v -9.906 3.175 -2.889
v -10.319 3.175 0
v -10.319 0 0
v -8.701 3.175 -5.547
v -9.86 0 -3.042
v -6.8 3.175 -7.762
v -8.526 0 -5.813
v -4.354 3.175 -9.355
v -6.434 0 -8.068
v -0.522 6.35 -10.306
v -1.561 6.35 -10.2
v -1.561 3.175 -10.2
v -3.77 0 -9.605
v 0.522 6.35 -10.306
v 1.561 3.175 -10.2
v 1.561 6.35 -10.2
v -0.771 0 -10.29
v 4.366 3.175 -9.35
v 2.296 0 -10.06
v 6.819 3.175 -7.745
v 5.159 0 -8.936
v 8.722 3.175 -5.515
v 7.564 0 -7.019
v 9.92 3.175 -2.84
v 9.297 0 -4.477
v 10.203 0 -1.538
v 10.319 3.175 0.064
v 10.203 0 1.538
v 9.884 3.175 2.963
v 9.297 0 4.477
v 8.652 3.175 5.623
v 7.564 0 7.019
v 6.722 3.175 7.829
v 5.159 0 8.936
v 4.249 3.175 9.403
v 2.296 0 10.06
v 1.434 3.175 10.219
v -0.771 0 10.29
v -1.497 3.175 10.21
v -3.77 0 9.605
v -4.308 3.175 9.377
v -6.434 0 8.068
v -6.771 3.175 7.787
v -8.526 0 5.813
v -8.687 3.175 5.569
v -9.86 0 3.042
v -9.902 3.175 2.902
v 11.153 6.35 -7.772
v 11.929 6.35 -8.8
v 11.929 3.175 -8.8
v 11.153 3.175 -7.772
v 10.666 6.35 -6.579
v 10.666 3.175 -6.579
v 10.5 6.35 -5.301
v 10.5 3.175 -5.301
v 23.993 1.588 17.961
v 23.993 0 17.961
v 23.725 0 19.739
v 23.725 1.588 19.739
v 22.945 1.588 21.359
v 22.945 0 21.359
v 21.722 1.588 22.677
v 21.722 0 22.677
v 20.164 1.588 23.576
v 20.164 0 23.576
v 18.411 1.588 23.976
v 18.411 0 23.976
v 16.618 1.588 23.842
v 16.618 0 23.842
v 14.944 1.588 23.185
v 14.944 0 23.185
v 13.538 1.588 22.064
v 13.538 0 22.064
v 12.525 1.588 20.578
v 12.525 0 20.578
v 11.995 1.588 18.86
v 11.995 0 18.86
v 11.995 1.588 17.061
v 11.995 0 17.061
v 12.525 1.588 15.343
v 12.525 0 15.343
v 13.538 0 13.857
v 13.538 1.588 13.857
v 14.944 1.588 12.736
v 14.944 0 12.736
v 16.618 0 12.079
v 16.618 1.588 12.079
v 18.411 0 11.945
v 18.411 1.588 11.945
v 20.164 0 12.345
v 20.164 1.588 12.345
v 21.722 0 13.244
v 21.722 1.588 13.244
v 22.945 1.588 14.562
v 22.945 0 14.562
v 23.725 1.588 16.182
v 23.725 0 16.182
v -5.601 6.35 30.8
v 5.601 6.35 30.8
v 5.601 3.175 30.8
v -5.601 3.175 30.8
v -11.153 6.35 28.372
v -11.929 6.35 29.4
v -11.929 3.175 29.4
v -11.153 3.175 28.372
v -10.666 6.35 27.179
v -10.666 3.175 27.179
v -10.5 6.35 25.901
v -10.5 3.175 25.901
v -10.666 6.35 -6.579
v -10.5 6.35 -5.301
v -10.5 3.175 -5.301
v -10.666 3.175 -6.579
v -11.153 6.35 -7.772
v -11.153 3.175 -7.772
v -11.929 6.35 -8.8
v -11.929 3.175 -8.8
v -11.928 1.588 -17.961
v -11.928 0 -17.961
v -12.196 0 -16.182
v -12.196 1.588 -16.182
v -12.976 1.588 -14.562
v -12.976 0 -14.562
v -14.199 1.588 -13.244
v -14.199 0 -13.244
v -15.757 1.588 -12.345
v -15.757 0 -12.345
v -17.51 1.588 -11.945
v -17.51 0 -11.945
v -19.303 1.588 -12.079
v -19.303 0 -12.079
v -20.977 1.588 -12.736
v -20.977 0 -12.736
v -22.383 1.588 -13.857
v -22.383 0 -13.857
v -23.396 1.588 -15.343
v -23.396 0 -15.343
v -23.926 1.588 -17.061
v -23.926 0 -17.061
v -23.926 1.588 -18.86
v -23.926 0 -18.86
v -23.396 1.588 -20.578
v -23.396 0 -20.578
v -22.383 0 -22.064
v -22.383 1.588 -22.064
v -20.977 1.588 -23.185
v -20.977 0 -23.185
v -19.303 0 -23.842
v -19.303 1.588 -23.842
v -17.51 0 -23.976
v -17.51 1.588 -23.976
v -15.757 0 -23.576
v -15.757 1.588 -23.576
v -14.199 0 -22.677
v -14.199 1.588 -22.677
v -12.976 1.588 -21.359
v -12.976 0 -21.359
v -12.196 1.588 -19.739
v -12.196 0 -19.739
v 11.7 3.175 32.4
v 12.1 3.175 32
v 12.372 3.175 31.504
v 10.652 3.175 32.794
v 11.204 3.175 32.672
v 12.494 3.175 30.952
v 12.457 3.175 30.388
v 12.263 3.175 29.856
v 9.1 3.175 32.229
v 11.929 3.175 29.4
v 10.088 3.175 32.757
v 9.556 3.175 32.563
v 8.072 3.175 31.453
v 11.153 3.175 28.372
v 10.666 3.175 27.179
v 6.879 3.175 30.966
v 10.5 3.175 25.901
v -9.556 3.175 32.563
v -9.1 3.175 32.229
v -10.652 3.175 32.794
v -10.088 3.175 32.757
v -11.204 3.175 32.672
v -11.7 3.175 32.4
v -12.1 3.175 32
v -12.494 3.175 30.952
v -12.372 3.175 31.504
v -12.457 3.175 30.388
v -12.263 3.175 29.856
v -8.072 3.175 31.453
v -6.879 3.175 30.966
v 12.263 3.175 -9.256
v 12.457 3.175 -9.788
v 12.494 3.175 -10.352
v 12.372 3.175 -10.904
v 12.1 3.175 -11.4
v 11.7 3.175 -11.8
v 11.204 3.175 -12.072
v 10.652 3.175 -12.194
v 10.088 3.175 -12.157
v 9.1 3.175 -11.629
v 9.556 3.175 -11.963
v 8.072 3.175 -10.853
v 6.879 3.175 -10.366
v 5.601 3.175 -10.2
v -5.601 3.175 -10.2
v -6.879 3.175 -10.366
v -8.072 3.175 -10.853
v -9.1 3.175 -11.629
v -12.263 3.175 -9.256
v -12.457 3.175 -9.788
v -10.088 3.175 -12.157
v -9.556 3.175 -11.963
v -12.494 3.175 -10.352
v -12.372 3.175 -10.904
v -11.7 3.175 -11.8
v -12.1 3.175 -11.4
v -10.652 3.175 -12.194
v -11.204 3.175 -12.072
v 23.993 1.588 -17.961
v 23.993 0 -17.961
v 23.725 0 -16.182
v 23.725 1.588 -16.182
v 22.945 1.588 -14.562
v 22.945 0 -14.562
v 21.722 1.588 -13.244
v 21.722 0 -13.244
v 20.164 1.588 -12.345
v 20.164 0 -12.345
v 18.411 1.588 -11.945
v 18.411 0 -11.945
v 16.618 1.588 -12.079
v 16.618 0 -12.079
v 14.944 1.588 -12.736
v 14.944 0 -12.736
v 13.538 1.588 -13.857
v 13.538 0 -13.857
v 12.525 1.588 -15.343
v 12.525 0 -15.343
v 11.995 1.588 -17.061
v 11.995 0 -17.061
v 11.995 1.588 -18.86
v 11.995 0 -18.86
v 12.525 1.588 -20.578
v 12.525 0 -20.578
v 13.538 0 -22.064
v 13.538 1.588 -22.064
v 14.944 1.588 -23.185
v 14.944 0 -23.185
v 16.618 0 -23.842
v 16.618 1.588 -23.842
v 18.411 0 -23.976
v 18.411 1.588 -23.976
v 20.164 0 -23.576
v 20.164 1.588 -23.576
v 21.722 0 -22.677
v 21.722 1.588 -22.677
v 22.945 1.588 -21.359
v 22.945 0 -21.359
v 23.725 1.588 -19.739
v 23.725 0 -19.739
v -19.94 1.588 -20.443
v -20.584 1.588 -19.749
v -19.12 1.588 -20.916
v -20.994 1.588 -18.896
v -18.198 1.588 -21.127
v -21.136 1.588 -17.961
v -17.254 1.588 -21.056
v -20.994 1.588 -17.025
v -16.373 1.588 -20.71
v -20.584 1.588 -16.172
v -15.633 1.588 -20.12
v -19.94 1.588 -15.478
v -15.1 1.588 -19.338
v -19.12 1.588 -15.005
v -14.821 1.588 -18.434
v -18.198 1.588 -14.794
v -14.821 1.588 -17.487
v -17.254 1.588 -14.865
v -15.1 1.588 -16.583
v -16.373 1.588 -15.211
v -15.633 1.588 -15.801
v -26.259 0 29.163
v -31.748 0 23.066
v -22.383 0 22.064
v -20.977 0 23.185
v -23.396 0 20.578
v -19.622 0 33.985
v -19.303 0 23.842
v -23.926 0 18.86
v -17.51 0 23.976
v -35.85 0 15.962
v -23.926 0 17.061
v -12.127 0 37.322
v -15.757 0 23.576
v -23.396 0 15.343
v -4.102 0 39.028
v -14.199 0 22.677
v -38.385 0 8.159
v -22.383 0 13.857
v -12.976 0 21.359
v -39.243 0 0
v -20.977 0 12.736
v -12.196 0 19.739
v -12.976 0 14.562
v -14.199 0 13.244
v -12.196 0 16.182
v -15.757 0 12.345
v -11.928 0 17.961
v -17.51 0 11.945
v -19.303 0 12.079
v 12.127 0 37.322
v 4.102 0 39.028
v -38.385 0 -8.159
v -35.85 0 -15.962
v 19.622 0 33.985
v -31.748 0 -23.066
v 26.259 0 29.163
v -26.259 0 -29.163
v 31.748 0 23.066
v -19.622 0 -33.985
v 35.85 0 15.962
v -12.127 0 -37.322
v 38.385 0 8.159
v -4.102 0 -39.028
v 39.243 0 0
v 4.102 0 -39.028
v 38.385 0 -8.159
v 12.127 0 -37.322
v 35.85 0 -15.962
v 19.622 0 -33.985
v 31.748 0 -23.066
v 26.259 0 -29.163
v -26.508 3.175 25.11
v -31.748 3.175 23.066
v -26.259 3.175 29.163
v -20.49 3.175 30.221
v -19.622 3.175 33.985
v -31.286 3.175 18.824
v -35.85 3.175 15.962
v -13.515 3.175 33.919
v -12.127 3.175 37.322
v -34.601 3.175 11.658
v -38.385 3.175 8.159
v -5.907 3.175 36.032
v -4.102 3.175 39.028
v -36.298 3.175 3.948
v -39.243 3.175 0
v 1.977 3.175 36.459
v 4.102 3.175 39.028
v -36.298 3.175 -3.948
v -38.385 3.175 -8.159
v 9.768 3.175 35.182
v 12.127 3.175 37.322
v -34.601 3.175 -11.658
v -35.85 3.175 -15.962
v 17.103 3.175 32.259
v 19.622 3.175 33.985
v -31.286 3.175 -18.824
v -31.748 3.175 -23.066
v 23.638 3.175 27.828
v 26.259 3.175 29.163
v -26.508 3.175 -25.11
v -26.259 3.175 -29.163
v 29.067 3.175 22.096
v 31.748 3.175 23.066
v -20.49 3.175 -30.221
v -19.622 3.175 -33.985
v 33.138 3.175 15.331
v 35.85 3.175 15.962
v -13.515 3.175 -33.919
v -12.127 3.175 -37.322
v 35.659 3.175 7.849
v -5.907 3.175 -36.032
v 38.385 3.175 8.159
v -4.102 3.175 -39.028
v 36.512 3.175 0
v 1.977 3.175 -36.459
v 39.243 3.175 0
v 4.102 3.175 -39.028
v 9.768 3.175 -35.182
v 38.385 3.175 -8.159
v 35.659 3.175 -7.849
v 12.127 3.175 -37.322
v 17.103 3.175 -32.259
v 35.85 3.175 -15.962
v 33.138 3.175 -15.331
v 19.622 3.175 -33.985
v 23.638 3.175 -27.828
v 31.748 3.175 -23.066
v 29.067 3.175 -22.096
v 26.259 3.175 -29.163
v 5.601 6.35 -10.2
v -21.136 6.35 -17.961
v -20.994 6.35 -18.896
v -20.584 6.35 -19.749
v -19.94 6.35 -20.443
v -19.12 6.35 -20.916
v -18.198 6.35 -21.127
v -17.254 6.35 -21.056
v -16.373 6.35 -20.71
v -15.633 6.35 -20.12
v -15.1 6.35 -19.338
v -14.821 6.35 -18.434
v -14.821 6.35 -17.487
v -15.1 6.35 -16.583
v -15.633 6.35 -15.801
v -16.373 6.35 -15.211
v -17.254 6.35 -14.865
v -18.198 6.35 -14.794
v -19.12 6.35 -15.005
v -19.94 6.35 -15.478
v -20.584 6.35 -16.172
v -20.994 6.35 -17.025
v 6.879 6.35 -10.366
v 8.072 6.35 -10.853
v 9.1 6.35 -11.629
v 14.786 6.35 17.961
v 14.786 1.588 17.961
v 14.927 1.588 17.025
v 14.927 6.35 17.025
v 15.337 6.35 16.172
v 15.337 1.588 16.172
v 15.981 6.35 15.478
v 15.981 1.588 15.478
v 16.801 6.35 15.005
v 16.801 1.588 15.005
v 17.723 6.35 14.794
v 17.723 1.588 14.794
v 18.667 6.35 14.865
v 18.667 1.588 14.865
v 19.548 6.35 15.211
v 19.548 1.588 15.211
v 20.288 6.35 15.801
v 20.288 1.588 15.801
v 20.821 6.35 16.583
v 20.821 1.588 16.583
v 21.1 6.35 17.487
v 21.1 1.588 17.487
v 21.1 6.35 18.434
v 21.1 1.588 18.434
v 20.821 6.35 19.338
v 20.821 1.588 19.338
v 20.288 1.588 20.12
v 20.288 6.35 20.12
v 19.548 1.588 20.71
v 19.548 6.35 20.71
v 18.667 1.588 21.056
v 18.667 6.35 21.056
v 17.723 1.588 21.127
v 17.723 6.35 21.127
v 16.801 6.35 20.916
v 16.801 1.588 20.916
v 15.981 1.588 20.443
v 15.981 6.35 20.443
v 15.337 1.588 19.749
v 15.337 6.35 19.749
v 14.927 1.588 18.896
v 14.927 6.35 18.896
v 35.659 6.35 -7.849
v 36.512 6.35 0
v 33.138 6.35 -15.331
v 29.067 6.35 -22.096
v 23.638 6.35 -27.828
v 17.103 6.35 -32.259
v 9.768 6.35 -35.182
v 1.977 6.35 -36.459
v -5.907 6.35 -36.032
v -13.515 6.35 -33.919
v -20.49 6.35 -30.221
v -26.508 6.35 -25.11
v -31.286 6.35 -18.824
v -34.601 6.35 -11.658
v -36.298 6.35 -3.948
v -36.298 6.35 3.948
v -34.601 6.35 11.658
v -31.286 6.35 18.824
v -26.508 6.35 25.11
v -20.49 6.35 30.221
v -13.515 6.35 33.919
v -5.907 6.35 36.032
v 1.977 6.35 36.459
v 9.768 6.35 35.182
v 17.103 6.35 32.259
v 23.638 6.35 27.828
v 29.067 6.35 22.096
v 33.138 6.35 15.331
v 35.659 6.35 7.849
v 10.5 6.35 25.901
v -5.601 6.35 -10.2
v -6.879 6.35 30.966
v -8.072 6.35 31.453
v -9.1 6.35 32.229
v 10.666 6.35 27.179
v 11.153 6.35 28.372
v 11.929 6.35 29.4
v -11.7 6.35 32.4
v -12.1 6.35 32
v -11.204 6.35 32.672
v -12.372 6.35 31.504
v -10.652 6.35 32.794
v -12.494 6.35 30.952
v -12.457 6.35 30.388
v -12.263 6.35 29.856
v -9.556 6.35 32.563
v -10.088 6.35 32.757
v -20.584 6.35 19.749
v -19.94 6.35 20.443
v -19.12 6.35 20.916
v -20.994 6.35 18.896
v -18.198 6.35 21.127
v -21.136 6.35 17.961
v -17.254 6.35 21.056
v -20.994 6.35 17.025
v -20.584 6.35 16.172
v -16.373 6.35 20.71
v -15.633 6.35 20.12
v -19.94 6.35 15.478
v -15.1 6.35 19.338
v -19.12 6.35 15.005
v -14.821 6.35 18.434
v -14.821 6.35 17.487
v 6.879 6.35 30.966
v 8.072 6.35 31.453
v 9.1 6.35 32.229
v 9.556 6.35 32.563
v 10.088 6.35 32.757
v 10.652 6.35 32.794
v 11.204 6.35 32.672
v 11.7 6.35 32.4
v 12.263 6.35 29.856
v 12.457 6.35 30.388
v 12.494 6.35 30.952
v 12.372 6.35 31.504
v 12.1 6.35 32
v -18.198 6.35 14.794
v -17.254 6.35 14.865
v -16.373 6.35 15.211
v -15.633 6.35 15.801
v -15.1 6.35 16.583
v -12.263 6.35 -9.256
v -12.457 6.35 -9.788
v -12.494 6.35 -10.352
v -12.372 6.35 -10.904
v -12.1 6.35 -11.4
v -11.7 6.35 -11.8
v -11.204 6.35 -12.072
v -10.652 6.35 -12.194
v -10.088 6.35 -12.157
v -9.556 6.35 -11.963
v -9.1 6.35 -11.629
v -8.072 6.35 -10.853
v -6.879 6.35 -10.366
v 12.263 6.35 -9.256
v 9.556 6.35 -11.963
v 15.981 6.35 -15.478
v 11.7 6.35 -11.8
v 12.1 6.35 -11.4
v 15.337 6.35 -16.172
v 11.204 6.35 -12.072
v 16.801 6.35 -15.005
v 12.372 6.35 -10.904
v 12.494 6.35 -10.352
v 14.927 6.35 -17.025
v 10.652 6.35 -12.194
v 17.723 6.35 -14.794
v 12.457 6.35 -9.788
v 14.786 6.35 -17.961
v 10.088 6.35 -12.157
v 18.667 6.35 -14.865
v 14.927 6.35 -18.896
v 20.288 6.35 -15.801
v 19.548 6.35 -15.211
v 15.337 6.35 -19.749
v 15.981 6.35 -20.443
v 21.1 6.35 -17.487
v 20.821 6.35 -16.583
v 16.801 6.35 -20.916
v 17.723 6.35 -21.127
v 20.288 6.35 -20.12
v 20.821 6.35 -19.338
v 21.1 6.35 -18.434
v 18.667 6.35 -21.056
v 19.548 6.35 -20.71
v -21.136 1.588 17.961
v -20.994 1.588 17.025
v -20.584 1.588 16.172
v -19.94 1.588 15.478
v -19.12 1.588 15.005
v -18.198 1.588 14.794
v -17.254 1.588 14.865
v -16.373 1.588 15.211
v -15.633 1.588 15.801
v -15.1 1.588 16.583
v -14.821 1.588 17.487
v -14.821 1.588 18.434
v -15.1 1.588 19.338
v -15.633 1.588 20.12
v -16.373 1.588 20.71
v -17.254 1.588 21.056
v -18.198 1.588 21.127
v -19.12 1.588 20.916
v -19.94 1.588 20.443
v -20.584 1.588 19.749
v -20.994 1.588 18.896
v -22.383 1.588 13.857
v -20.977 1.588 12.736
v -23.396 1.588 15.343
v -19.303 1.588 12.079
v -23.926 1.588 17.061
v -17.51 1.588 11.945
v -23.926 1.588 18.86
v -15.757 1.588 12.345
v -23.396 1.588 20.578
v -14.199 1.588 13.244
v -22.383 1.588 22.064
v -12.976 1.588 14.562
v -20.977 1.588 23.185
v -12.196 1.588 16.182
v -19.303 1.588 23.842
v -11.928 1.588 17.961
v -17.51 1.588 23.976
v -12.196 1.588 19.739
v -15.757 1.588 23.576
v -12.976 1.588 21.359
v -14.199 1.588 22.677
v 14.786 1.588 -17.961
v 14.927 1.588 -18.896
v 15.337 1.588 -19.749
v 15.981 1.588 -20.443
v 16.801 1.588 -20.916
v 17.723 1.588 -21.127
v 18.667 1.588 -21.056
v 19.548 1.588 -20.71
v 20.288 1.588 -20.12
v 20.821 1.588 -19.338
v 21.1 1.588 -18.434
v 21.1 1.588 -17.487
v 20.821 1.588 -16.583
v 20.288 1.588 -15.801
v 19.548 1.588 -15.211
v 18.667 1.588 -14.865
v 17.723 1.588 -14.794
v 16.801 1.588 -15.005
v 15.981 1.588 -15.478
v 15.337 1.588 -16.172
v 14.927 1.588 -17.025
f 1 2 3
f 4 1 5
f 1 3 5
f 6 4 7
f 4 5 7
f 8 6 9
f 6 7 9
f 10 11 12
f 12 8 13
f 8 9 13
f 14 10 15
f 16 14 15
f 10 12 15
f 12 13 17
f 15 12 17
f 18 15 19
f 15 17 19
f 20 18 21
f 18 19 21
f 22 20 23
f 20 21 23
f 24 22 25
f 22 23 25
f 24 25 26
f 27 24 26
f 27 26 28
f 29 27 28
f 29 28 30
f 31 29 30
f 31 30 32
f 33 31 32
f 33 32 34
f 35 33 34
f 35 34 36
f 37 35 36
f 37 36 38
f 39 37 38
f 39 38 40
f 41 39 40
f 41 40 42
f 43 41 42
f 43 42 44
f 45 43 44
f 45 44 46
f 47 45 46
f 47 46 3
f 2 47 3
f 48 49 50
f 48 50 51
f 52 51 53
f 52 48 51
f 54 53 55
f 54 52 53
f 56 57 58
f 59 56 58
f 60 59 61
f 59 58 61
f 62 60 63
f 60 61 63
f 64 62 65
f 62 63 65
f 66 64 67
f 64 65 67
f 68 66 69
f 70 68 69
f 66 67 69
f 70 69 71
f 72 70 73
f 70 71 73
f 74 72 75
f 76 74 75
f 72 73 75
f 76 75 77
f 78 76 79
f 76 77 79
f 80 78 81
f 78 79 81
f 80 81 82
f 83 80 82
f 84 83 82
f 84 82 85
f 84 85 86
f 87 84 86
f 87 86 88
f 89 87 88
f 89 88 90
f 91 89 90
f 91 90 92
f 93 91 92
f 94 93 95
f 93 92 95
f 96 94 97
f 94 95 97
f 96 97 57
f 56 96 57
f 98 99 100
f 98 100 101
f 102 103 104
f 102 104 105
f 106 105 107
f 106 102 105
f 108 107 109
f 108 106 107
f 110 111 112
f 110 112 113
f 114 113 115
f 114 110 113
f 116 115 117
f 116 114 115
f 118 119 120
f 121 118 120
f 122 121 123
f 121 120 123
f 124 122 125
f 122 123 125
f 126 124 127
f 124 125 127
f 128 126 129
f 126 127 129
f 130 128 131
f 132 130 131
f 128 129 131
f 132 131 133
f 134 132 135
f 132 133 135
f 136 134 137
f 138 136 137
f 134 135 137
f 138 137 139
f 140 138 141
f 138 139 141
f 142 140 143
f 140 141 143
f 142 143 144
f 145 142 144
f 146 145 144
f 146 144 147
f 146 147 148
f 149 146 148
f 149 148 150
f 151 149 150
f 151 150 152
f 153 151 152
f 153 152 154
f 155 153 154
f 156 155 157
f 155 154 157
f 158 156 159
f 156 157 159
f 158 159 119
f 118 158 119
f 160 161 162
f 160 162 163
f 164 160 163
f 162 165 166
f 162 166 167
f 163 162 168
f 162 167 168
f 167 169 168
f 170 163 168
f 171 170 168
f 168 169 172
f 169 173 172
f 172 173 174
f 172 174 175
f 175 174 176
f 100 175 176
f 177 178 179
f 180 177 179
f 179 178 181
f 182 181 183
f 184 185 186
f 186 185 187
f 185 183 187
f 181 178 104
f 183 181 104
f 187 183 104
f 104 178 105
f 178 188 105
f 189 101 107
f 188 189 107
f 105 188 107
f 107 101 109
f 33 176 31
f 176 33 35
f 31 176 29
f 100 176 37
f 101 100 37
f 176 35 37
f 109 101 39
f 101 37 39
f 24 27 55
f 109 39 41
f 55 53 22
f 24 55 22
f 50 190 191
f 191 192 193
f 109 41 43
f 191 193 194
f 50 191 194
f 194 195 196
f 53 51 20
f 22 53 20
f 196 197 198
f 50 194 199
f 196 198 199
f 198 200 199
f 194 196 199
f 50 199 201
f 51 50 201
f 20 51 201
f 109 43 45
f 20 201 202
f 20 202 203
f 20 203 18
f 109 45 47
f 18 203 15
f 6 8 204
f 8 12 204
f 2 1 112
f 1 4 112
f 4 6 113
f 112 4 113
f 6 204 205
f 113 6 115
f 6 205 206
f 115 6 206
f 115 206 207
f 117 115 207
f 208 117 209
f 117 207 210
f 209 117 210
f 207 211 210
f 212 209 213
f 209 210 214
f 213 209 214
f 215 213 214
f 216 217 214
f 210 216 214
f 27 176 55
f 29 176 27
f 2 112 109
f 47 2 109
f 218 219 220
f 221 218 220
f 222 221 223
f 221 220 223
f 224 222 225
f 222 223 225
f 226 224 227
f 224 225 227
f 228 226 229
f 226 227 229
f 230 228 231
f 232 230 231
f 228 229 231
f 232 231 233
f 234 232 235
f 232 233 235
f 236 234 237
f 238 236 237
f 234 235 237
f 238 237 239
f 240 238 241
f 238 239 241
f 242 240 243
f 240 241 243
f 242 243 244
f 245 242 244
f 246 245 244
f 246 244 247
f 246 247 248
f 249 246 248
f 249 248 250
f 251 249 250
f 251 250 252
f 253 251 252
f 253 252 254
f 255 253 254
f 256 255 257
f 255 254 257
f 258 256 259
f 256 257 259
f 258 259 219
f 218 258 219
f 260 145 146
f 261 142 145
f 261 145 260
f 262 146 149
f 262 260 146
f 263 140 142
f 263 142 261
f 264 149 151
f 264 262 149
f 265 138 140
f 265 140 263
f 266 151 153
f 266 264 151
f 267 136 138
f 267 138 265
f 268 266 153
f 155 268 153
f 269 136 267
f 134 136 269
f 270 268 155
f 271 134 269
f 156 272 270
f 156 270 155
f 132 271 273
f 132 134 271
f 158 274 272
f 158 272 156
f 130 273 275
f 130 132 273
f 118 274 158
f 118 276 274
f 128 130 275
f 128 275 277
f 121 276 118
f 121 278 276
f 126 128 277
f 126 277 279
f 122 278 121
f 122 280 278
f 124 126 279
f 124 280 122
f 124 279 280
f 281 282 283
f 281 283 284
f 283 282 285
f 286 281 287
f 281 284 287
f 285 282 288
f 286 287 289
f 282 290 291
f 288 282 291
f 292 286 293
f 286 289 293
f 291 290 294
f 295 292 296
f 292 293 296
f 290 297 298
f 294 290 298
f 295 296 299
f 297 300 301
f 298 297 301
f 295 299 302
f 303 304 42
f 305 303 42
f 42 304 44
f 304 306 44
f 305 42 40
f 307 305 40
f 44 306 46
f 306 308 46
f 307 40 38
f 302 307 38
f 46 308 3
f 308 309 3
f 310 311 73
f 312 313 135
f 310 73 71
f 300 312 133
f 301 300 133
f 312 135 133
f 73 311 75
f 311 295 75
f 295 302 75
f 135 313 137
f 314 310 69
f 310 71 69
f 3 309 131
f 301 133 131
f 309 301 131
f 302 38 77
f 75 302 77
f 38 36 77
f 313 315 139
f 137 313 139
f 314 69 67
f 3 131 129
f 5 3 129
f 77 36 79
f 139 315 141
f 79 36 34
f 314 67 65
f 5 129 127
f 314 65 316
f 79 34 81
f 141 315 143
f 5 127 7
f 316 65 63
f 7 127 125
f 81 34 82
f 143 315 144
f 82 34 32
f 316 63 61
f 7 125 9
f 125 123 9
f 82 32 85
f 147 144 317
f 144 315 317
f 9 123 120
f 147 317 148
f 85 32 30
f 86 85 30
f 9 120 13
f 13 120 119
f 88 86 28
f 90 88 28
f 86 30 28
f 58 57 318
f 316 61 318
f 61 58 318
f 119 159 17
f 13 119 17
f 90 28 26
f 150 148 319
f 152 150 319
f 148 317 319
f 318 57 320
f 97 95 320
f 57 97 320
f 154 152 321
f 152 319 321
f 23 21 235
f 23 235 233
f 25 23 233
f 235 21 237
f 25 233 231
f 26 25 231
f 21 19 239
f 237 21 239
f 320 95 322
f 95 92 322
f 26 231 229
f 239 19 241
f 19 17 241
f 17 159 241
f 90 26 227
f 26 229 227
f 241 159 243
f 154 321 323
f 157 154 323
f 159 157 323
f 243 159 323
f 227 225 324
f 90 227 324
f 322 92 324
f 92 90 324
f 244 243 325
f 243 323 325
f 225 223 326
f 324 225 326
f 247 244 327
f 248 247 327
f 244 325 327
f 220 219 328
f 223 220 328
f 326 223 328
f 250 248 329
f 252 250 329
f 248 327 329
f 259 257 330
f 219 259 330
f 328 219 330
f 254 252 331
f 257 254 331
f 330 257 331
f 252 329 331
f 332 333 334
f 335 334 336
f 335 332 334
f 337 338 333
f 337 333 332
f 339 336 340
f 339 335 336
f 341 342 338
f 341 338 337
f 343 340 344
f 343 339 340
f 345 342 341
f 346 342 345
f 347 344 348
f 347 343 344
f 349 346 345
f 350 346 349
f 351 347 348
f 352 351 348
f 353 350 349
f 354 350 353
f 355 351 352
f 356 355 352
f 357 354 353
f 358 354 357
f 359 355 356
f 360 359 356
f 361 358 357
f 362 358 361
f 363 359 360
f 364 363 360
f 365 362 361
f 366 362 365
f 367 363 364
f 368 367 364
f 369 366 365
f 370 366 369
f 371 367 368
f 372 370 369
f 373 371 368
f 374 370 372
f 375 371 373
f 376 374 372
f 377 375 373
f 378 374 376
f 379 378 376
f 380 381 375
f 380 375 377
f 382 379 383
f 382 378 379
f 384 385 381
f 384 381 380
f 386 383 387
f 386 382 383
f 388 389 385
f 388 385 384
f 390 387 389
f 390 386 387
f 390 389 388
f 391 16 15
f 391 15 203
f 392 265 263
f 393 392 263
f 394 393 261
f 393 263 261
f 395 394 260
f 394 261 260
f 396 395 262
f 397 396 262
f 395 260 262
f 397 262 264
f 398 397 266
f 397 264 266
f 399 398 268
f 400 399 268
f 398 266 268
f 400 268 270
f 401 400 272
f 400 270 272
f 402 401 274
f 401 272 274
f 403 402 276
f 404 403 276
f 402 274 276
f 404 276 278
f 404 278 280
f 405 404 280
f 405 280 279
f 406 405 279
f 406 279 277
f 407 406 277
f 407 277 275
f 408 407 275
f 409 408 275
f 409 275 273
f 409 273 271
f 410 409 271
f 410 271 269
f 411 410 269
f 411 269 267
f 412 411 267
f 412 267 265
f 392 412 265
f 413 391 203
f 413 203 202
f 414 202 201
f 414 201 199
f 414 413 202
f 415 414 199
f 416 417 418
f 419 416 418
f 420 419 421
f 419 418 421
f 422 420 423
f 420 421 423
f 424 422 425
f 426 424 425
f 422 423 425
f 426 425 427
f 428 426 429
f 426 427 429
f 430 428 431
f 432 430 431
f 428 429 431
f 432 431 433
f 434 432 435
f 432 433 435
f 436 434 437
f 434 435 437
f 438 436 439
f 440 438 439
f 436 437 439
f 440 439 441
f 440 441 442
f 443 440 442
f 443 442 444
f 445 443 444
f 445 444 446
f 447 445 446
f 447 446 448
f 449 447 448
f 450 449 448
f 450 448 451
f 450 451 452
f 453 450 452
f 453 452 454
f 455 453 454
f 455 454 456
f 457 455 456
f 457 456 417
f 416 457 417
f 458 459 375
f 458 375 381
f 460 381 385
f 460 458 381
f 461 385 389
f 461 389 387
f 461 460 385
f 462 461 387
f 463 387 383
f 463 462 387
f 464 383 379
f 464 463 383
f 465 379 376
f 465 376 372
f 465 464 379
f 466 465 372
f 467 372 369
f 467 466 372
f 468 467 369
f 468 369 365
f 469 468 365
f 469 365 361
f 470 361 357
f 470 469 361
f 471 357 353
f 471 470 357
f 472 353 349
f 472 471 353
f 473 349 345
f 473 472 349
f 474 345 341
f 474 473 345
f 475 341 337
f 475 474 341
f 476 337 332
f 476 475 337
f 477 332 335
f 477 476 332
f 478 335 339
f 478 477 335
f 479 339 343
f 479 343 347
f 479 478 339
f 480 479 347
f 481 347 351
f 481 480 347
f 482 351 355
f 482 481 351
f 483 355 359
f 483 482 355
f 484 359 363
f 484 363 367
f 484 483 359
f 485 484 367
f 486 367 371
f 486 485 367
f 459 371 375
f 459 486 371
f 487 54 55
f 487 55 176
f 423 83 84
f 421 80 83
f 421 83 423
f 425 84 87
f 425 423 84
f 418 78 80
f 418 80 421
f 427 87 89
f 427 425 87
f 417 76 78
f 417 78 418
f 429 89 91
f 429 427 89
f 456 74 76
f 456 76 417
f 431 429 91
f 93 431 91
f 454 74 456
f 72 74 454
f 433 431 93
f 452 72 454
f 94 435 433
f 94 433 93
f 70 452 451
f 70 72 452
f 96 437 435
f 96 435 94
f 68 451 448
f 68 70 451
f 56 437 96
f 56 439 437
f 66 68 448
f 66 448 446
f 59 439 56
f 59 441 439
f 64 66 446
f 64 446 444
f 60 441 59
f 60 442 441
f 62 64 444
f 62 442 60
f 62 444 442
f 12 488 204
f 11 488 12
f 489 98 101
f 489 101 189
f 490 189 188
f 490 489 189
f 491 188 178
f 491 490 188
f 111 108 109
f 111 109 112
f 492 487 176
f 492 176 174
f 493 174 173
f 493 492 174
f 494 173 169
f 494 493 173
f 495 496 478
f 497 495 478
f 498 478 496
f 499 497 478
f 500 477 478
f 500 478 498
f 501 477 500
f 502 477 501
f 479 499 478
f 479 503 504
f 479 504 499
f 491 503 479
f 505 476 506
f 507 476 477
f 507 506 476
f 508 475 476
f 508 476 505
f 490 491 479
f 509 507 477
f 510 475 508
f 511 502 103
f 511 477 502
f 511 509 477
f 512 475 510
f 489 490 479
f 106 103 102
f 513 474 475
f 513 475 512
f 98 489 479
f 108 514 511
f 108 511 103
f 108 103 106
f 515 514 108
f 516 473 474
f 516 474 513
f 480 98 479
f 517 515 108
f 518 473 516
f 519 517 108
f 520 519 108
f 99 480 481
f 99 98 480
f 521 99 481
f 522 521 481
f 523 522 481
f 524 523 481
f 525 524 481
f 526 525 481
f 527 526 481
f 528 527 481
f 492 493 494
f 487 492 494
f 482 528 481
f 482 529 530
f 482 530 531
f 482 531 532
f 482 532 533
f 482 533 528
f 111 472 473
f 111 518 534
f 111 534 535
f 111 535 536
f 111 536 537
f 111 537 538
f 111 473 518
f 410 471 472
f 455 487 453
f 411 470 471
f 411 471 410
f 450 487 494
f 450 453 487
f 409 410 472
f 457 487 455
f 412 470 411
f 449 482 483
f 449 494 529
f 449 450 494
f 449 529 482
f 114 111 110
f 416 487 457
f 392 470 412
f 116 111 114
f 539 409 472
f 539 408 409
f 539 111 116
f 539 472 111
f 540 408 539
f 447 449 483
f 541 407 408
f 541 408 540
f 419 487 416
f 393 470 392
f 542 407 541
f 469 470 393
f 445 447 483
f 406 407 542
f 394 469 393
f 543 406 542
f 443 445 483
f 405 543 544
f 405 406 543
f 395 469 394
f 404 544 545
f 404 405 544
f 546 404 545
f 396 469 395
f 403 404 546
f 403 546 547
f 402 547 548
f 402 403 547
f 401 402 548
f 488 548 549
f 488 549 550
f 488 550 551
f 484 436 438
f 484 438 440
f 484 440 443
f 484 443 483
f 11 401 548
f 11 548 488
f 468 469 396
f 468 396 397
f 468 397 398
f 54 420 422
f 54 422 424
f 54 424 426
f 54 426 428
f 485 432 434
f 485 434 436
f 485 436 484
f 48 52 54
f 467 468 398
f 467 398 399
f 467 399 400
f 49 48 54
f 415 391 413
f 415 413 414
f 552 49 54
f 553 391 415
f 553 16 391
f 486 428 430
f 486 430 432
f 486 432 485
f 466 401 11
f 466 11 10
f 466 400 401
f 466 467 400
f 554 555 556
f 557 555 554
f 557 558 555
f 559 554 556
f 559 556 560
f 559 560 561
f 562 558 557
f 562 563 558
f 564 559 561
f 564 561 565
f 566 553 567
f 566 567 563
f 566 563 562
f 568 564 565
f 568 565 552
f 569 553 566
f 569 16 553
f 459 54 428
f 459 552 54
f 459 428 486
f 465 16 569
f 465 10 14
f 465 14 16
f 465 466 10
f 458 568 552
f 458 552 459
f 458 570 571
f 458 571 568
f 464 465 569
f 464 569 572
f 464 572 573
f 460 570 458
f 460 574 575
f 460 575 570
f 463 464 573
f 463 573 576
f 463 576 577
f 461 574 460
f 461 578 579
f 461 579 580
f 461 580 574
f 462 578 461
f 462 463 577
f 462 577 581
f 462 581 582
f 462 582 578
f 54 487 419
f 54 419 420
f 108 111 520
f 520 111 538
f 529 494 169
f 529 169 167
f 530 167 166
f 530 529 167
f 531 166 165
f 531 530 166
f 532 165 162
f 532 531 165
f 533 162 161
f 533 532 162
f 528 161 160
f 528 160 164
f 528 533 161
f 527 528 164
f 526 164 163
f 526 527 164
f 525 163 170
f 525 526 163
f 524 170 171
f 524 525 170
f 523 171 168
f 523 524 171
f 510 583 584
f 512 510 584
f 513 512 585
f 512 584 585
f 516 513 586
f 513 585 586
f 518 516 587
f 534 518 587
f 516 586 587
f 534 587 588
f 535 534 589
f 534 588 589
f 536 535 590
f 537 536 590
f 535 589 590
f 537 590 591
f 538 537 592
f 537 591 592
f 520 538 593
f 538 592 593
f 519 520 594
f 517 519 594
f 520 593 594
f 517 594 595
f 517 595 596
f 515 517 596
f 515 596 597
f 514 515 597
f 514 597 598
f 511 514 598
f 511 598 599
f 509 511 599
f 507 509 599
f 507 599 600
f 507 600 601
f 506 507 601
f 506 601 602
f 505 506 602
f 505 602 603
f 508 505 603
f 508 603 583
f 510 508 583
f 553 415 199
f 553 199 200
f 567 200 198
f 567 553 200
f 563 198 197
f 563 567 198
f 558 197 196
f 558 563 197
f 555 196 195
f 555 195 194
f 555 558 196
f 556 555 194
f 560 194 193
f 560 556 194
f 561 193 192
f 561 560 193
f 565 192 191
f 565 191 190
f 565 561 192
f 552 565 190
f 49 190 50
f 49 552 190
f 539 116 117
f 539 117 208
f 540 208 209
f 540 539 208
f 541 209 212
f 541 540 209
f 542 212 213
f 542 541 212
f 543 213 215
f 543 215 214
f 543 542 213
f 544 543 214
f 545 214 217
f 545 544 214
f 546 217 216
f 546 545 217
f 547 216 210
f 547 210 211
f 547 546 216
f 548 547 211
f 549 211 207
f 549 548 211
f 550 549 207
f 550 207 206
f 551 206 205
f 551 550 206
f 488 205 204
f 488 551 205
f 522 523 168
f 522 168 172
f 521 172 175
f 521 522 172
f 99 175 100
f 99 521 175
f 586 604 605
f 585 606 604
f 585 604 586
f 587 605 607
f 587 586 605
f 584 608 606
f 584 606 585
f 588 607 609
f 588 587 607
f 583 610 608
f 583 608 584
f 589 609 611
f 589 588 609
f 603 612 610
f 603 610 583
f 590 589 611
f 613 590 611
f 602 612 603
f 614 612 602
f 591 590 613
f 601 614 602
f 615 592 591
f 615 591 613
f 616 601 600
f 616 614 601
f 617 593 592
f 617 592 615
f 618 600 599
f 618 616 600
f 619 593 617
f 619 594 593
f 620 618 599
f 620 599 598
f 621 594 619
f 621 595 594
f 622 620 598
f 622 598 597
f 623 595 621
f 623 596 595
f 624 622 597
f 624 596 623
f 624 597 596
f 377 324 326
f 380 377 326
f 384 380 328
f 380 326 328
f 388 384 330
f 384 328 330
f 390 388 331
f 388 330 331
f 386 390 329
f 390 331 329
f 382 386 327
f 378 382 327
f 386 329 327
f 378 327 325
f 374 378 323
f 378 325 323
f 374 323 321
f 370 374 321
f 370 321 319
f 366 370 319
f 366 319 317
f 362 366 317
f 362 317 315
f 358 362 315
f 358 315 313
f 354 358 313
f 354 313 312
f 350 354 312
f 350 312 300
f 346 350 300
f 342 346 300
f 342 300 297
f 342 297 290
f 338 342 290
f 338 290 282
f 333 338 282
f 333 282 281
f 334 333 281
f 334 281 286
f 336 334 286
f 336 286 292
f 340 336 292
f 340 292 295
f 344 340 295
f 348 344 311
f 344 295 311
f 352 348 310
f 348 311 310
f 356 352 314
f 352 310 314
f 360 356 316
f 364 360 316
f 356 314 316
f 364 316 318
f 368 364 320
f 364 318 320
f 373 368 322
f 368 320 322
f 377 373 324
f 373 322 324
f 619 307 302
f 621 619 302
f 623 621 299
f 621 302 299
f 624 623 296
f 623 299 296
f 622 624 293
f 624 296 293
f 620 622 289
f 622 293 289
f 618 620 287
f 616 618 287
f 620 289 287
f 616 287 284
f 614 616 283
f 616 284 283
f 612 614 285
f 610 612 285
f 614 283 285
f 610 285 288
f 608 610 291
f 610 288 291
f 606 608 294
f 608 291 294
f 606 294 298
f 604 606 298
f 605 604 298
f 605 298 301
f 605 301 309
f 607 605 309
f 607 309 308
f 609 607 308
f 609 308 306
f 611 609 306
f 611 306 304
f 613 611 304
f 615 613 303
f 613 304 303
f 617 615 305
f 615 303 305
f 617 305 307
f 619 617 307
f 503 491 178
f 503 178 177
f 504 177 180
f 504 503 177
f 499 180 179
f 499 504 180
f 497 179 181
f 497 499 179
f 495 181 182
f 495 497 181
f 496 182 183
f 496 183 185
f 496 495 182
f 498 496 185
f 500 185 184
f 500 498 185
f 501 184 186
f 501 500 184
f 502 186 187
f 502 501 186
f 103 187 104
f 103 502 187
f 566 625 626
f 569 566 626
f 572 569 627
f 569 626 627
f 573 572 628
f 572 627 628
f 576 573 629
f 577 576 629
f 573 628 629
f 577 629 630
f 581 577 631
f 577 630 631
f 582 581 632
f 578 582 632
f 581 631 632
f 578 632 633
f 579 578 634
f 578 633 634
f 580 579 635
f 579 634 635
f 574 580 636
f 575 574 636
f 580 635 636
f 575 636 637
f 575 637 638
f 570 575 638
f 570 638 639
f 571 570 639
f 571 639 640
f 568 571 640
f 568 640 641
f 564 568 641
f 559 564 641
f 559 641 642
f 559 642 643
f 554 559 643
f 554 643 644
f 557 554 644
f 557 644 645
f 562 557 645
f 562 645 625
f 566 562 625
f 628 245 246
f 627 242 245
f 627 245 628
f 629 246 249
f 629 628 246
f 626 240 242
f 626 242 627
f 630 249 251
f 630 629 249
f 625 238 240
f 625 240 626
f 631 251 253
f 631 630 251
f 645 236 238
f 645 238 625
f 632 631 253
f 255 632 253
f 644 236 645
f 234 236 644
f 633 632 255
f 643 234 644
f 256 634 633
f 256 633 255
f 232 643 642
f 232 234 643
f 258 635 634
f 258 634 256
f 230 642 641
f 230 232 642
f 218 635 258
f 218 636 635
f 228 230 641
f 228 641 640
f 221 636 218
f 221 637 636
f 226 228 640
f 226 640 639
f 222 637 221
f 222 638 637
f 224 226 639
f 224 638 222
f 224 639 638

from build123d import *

# Parameters (mm, degrees)
SKETCH2_R                       = 39.243
BOSS_EXTRUDE1_DEPTH             = 6.35
SKETCH4_R                       = 39.243
SKETCH4_R_2                     = 36.5125
CUT_EXTRUDE1_DEPTH              = 3.175
F_1_4_0_25_DIAMETER_HOLE1_D     = 6.35
F_13_16_0_8125_DIAMETER_HOLE1_D = 20.6375
CUT_EXTRUDE3_DEPTH              = 3.175
SKETCH9_R                       = 6.0325
CUT_EXTRUDE2_DEPTH              = 1.5875


with BuildPart() as part:
    # Sketch2 → Boss-Extrude1 (new body)
    with BuildSketch(Plane(origin=(0, 0, 0), x_dir=(1, 0, 0), z_dir=(0, 1, 0))):
        Circle(SKETCH2_R)
    extrude(amount=BOSS_EXTRUDE1_DEPTH)

    # Sketch4 → Cut-Extrude1 (cut)
    with BuildSketch(Plane(origin=(0, 6.35, 0), x_dir=(1, 0, 0), z_dir=(0, 1, 0))):
        Circle(SKETCH4_R)
        Circle(SKETCH4_R_2, mode=Mode.SUBTRACT)
    extrude(amount=-CUT_EXTRUDE1_DEPTH, mode=Mode.SUBTRACT)

    # 1/4 (0.25) Diameter Hole1 (through all)
    with Locations(Plane(origin=(0, 6.35, 0), x_dir=(1, 0, 0), z_dir=(0, 1, 0))):
        with Locations((-17.960512242, 17.960512242), (-17.960512242, -17.960512242), (17.960512242, 17.960512242), (17.960512242, -17.960512242)):
            Hole(F_1_4_0_25_DIAMETER_HOLE1_D / 2)

    # 13/16 (0.8125) Diameter Hole1 (through all)
    with Locations(Plane(origin=(0, 6.35, 0), x_dir=(1, 0, 0), z_dir=(0, 1, 0))):
        with Locations((0, 0)):
            Hole(F_13_16_0_8125_DIAMETER_HOLE1_D / 2)

    # Sketch11 → Cut-Extrude3 (cut)
    with BuildSketch(Plane(origin=(0, 6.35, 0), x_dir=(1, 0, 0), z_dir=(0, 1, 0))):
        with BuildLine():
            Line((-5.601020514, 10.2), (5.601020514, 10.2))
            ThreePointArc((5.601020514, 10.2), (7.490842879, 10.570899501), (9.100291576, 11.628571429))
            ThreePointArc((9.100291576, 11.628571429), (11.914213562, 11.614213562), (11.928571429, 8.800291576))
            ThreePointArc((11.928571429, 8.800291576), (10.870899501, 7.190842879), (10.5, 5.301020514))
            Line((10.5, 5.301020514), (10.5, -25.901020514))
            ThreePointArc((10.5, -25.901020514), (10.870899501, -27.790842879), (11.928571429, -29.400291576))
            ThreePointArc((11.928571429, -29.400291576), (11.914213562, -32.214213562), (9.100291576, -32.228571429))
            ThreePointArc((9.100291576, -32.228571429), (7.490842879, -31.170899501), (5.601020514, -30.8))
            Line((5.601020514, -30.8), (-5.601020514, -30.8))
            ThreePointArc((-5.601020514, -30.8), (-7.490842879, -31.170899501), (-9.100291576, -32.228571429))
            ThreePointArc((-9.100291576, -32.228571429), (-11.914213562, -32.214213562), (-11.928571429, -29.400291576))
            ThreePointArc((-11.928571429, -29.400291576), (-10.870899501, -27.790842879), (-10.5, -25.901020514))
            Line((-10.5, -25.901020514), (-10.5, 5.301020514))
            ThreePointArc((-10.5, 5.301020514), (-10.870899501, 7.190842879), (-11.928571429, 8.800291576))
            ThreePointArc((-11.928571429, 8.800291576), (-11.914213562, 11.614213562), (-9.100291576, 11.628571429))
            ThreePointArc((-9.100291576, 11.628571429), (-7.490842879, 10.570899501), (-5.601020514, 10.2))
        make_face()
    extrude(amount=-CUT_EXTRUDE3_DEPTH, mode=Mode.SUBTRACT)

    # Sketch9 → Cut-Extrude2 (cut)
    with BuildSketch(Plane.XZ):
        with Locations((-17.960512242, 17.960512242)):
            Circle(SKETCH9_R)
        with Locations((17.960512242, 17.960512242)):
            Circle(SKETCH9_R)
        with Locations((17.960512242, -17.960512242)):
            Circle(SKETCH9_R)
        with Locations((-17.960512242, -17.960512242)):
            Circle(SKETCH9_R)
    extrude(amount=-CUT_EXTRUDE2_DEPTH, mode=Mode.SUBTRACT)


solid = part.part
